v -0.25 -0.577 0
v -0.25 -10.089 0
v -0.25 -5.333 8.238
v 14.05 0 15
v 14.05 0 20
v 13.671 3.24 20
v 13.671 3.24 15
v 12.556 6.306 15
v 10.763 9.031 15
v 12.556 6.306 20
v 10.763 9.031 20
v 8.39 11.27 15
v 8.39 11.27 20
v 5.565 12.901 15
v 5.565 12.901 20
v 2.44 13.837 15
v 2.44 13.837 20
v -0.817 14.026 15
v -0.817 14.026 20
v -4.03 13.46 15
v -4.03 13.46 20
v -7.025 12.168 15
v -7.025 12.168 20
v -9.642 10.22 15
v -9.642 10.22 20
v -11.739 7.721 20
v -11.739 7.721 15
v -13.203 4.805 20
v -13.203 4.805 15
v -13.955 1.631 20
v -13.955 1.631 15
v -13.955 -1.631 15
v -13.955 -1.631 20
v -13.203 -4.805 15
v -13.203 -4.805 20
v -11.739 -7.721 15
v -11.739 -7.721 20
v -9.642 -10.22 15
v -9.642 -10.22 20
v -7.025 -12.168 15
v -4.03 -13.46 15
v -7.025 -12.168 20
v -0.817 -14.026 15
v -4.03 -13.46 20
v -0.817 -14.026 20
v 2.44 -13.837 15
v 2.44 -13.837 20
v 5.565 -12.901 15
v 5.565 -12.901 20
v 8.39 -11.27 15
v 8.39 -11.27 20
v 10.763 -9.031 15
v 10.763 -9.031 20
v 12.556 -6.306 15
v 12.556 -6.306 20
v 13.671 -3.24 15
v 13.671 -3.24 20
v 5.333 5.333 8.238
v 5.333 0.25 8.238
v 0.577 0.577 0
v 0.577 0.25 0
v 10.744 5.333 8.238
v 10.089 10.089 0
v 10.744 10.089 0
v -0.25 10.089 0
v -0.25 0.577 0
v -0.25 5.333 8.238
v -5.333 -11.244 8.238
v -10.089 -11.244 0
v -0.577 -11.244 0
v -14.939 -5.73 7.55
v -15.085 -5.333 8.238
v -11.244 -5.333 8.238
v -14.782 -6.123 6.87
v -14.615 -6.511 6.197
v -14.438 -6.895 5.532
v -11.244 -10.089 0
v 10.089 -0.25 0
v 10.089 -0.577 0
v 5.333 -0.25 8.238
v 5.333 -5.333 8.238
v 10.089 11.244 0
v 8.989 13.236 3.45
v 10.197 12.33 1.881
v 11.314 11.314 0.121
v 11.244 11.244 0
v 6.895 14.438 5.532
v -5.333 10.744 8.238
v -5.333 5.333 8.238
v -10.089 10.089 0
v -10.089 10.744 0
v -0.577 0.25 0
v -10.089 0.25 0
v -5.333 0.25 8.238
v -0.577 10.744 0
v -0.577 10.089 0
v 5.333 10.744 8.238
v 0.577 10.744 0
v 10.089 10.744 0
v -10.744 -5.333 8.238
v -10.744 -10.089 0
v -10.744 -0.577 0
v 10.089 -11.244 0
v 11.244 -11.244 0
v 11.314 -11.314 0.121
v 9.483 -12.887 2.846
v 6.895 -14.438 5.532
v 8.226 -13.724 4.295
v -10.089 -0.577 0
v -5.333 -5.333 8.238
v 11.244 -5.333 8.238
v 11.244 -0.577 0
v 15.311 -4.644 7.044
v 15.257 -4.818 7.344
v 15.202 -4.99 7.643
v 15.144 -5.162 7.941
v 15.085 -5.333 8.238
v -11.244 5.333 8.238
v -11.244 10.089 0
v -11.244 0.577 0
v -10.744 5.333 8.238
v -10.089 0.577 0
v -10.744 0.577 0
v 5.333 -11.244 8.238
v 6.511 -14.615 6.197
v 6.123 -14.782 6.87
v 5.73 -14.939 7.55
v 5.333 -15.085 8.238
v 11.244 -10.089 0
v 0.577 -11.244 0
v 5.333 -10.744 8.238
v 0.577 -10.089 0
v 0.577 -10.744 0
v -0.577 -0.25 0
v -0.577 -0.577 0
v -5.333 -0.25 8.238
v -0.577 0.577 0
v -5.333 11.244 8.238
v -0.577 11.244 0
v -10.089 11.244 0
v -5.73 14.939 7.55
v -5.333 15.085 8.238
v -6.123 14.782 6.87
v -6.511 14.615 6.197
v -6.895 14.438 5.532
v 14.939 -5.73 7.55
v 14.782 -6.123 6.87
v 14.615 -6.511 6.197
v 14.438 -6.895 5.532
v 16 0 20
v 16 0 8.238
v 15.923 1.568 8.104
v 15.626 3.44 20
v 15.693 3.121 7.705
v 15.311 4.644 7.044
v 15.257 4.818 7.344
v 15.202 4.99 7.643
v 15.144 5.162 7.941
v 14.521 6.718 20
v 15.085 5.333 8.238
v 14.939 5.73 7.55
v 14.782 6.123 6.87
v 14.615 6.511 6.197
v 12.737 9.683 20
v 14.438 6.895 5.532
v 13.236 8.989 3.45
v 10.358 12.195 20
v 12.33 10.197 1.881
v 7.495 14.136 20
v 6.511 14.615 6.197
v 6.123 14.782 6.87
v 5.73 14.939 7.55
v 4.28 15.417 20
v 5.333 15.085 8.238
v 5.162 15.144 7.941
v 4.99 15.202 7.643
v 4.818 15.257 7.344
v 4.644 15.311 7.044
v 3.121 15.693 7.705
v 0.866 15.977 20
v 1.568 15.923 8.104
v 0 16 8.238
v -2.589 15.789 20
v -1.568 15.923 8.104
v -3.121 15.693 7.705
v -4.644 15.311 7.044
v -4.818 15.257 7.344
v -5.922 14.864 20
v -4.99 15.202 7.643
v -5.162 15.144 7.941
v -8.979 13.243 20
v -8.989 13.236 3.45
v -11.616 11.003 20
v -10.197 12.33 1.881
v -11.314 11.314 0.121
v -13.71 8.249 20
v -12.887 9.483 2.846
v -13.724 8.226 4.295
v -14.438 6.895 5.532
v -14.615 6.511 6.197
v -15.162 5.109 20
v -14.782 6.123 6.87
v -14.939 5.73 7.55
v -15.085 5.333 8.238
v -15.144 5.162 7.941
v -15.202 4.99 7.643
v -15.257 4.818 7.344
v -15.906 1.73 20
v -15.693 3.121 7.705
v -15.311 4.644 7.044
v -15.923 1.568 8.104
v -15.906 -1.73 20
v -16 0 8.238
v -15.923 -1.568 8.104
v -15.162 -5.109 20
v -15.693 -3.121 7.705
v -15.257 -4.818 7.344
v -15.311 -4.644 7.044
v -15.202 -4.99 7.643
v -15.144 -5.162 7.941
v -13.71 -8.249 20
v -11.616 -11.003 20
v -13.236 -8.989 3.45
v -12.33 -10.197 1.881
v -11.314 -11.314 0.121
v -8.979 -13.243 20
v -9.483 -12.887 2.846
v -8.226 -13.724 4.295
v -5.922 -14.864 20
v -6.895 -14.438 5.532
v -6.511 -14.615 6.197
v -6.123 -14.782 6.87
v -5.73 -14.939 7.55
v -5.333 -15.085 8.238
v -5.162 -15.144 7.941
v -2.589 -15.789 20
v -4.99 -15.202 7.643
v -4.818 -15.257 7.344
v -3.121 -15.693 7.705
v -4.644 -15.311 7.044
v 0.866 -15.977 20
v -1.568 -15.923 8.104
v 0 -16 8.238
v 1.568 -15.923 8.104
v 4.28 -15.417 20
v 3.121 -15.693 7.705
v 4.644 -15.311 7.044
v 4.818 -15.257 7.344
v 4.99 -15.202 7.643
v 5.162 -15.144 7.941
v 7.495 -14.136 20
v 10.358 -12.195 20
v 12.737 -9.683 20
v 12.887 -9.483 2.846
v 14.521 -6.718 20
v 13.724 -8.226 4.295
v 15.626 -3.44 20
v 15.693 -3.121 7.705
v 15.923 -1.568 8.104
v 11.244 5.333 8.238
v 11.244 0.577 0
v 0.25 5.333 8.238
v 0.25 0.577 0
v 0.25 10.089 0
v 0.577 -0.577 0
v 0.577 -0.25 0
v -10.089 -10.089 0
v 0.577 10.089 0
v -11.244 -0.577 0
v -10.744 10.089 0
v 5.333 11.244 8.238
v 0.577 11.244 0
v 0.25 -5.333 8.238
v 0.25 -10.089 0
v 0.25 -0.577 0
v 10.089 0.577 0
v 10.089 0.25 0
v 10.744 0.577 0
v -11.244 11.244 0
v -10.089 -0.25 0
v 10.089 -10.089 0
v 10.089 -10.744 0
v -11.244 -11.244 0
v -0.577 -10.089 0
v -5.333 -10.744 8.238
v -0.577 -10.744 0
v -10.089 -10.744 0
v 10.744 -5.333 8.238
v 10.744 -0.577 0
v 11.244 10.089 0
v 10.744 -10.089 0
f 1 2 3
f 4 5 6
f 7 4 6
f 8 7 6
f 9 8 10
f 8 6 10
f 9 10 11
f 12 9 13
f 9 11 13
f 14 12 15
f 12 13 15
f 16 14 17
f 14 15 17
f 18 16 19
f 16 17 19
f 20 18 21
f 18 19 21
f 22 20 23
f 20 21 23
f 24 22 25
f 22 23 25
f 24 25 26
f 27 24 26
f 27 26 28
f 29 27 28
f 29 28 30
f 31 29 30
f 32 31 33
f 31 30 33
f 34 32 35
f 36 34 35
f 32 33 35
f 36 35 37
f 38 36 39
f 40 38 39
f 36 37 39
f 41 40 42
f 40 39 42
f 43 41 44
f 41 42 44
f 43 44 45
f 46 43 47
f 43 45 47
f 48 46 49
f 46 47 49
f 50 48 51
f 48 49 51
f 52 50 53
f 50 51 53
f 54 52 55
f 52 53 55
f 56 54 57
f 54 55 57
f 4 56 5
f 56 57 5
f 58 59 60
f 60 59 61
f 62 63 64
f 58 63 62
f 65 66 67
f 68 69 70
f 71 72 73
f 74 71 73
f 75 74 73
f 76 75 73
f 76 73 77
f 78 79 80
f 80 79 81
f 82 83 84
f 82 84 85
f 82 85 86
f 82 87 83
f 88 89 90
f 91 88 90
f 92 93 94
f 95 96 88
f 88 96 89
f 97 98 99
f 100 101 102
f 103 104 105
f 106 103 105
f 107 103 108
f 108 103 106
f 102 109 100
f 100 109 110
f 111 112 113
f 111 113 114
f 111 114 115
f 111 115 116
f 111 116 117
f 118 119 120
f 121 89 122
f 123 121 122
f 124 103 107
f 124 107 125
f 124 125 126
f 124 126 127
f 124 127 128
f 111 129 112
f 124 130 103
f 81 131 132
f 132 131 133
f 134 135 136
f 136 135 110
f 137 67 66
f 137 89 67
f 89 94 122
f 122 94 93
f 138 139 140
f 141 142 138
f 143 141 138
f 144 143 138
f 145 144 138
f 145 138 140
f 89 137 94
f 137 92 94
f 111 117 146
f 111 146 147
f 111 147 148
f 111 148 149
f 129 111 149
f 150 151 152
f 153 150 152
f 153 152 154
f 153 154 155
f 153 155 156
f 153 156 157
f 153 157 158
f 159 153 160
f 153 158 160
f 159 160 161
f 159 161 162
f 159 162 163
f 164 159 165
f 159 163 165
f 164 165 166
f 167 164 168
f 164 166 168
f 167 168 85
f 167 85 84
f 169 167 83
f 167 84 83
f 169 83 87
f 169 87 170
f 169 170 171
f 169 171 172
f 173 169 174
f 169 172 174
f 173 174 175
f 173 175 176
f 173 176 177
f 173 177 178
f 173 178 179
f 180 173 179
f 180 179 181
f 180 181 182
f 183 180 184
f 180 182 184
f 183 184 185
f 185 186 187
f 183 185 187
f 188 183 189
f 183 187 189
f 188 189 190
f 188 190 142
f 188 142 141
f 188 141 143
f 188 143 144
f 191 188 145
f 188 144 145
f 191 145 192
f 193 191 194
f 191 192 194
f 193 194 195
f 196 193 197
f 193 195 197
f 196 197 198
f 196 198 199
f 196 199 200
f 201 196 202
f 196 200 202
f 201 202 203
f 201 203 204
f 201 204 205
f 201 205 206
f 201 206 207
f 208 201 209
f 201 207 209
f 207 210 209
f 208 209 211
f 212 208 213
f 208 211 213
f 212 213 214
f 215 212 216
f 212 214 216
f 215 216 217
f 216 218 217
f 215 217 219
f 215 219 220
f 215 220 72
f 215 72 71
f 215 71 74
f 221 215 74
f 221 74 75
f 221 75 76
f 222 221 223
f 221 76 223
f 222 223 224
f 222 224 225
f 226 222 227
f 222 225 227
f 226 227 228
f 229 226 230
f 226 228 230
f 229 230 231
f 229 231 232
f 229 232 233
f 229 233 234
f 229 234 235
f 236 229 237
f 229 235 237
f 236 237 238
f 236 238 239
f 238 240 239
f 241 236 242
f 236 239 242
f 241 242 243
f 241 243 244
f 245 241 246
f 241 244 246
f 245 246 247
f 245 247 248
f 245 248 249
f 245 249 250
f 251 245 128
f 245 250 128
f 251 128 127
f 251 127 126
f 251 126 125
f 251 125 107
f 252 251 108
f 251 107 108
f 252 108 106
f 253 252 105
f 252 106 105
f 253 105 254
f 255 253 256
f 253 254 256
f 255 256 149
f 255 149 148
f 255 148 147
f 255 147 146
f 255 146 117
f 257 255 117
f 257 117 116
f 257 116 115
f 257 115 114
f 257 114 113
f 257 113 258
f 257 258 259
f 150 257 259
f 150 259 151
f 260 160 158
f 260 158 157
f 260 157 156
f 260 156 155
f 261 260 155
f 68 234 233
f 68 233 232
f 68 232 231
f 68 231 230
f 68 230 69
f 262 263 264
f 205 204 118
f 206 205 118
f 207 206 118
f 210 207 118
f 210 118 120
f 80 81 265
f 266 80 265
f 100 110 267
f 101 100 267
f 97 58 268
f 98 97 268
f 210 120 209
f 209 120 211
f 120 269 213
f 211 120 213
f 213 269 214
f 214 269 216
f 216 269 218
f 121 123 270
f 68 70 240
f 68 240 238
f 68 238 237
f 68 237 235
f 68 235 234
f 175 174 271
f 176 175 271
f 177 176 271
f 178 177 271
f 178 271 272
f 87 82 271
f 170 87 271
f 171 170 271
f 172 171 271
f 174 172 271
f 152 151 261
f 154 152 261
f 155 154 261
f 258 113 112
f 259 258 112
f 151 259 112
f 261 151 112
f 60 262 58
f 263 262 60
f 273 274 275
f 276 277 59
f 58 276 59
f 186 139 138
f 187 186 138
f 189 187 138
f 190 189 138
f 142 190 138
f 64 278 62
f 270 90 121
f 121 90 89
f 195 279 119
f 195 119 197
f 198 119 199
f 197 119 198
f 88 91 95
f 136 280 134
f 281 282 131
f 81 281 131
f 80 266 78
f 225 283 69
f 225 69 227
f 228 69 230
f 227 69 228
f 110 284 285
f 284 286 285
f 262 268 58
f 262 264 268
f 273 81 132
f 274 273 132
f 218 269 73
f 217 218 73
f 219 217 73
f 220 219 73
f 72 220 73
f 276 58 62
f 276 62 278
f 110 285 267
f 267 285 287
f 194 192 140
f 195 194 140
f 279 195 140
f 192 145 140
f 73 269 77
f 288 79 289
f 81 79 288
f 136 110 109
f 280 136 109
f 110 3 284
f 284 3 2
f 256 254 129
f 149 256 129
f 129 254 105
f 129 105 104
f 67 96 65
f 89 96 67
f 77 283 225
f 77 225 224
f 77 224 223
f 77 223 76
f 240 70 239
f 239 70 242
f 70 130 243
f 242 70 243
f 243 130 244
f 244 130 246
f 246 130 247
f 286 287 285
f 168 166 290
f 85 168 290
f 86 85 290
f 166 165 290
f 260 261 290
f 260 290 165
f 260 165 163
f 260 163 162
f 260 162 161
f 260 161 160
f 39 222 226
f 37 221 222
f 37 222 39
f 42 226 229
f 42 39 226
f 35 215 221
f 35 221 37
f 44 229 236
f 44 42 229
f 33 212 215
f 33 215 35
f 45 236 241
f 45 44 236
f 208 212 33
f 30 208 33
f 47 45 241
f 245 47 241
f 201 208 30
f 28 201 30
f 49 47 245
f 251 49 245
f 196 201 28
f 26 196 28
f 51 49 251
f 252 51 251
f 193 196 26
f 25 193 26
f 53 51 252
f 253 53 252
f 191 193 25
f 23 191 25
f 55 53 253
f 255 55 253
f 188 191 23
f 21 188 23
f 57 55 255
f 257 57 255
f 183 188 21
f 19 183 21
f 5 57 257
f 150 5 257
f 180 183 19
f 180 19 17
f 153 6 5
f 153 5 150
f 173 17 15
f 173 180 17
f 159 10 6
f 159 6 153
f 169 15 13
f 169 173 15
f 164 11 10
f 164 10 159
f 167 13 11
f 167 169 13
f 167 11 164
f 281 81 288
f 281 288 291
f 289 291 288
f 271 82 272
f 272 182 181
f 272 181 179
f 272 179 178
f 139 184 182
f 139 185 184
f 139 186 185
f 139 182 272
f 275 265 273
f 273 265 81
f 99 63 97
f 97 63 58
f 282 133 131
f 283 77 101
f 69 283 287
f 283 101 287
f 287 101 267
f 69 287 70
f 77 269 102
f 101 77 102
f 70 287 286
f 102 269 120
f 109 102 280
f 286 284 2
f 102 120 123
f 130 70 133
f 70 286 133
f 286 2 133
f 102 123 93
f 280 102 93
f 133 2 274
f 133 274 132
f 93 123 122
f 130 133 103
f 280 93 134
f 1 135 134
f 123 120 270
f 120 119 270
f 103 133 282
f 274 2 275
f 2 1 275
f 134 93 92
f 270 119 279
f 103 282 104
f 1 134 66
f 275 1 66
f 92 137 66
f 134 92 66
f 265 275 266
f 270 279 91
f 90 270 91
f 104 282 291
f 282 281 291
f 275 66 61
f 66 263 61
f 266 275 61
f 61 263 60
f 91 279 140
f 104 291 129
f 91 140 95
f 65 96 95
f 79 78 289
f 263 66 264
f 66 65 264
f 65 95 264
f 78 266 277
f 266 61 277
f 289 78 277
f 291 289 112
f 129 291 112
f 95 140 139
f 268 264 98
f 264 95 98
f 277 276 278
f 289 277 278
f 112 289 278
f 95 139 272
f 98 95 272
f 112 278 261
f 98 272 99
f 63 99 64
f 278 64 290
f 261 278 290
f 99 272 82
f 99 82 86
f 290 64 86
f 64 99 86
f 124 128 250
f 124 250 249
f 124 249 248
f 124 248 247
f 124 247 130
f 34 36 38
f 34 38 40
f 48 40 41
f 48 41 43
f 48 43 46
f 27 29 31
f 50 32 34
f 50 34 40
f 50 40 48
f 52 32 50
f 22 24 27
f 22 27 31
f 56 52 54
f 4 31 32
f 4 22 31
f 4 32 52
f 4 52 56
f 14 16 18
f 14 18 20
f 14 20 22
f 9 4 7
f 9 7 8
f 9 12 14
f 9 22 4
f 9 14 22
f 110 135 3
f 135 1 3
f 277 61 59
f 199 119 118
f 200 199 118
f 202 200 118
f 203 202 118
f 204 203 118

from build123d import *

# Parameters (mm, degrees)
F0_R          = 16
F1_DEPTH      = 20
F3_DEPTH      = 25
F5_DEPTH      = 16.001
F5_DEPTH_BACK = 16.001
F6_R          = 14.05
F7_DEPTH      = 5
F8_W          = 10.4940169359
F8_H          = 10.4940169359
F9_DEPTH      = 10.92124


with BuildPart() as f1:
    # F0 (on Top) → F1 (new body)
    with BuildSketch(Plane.XY):
        Circle(F0_R)
    extrude(amount=F1_DEPTH)

    # F2 (on Front) → F3 (cut, symmetric)
    with BuildSketch(Plane.XZ):
        Polygon((16, 8.237604307), (10.6666666667, -1), (21.3333333333, -1), align=None)
        Polygon((5.3333333333, 8.237604307), (0, -1), (10.6666666667, -1), align=None)
        Polygon((-5.3333333333, 8.237604307), (-10.6666666667, -1), (0, -1), align=None)
        Polygon((-16, 8.237604307), (-21.3333333333, -1), (-10.6666666667, -1), align=None)
    extrude(amount=F3_DEPTH, both=True, mode=Mode.SUBTRACT)

    # F4 (on Right) → F5 (cut, two sides)
    with BuildSketch(Plane.YZ) as f5_sk:
        Polygon((16, 8.237604307), (10.6666666667, -1), (21.3333333333, -1), align=None)
        Polygon((5.3333333333, 8.237604307), (0, -1), (10.6666666667, -1), align=None)
        Polygon((-5.3333333333, 8.237604307), (-10.6666666667, -1), (0, -1), align=None)
        Polygon((-16, 8.237604307), (-21.3333333333, -1), (-10.6666666667, -1), align=None)
    extrude(amount=-F5_DEPTH, mode=Mode.SUBTRACT)
    extrude(f5_sk.sketch, amount=F5_DEPTH_BACK, mode=Mode.SUBTRACT)

    # F6 (on face) → F7 (cut)
    with BuildSketch(Plane.XY.offset(20)):
        Circle(F6_R)
    extrude(amount=-F7_DEPTH, mode=Mode.SUBTRACT)

    # F8 (on Top) → F9 (join)
    with BuildSketch(Plane.XY):
        Polygon((-11.2440169359, -11.2440169359), (11.2440169359, -11.2440169359), (11.2440169359, -10.7440169359), (11.2440169359, -0.25), (11.2440169359, 0.25), (11.2440169359, 10.7440169359), (11.2440169359, 11.2440169359), (-11.2440169359, 11.2440169359), (-11.2440169359, 10.7440169359), (-11.2440169359, 0.25), (-11.2440169359, -0.25), (-11.2440169359, -10.7440169359), align=None)
        with Locations((-5.4970084679, -5.4970084679)):
            Rectangle(F8_W, F8_H, mode=Mode.SUBTRACT)
        with Locations((5.4970084679, -5.4970084679)):
            Rectangle(F8_W, F8_H, mode=Mode.SUBTRACT)
        with Locations((-5.4970084679, 5.4970084679)):
            Rectangle(F8_W, F8_H, mode=Mode.SUBTRACT)
        with Locations((5.4970084679, 5.4970084679)):
            Rectangle(F8_W, F8_H, mode=Mode.SUBTRACT)
    extrude(amount=F9_DEPTH)


solid = f1.part
